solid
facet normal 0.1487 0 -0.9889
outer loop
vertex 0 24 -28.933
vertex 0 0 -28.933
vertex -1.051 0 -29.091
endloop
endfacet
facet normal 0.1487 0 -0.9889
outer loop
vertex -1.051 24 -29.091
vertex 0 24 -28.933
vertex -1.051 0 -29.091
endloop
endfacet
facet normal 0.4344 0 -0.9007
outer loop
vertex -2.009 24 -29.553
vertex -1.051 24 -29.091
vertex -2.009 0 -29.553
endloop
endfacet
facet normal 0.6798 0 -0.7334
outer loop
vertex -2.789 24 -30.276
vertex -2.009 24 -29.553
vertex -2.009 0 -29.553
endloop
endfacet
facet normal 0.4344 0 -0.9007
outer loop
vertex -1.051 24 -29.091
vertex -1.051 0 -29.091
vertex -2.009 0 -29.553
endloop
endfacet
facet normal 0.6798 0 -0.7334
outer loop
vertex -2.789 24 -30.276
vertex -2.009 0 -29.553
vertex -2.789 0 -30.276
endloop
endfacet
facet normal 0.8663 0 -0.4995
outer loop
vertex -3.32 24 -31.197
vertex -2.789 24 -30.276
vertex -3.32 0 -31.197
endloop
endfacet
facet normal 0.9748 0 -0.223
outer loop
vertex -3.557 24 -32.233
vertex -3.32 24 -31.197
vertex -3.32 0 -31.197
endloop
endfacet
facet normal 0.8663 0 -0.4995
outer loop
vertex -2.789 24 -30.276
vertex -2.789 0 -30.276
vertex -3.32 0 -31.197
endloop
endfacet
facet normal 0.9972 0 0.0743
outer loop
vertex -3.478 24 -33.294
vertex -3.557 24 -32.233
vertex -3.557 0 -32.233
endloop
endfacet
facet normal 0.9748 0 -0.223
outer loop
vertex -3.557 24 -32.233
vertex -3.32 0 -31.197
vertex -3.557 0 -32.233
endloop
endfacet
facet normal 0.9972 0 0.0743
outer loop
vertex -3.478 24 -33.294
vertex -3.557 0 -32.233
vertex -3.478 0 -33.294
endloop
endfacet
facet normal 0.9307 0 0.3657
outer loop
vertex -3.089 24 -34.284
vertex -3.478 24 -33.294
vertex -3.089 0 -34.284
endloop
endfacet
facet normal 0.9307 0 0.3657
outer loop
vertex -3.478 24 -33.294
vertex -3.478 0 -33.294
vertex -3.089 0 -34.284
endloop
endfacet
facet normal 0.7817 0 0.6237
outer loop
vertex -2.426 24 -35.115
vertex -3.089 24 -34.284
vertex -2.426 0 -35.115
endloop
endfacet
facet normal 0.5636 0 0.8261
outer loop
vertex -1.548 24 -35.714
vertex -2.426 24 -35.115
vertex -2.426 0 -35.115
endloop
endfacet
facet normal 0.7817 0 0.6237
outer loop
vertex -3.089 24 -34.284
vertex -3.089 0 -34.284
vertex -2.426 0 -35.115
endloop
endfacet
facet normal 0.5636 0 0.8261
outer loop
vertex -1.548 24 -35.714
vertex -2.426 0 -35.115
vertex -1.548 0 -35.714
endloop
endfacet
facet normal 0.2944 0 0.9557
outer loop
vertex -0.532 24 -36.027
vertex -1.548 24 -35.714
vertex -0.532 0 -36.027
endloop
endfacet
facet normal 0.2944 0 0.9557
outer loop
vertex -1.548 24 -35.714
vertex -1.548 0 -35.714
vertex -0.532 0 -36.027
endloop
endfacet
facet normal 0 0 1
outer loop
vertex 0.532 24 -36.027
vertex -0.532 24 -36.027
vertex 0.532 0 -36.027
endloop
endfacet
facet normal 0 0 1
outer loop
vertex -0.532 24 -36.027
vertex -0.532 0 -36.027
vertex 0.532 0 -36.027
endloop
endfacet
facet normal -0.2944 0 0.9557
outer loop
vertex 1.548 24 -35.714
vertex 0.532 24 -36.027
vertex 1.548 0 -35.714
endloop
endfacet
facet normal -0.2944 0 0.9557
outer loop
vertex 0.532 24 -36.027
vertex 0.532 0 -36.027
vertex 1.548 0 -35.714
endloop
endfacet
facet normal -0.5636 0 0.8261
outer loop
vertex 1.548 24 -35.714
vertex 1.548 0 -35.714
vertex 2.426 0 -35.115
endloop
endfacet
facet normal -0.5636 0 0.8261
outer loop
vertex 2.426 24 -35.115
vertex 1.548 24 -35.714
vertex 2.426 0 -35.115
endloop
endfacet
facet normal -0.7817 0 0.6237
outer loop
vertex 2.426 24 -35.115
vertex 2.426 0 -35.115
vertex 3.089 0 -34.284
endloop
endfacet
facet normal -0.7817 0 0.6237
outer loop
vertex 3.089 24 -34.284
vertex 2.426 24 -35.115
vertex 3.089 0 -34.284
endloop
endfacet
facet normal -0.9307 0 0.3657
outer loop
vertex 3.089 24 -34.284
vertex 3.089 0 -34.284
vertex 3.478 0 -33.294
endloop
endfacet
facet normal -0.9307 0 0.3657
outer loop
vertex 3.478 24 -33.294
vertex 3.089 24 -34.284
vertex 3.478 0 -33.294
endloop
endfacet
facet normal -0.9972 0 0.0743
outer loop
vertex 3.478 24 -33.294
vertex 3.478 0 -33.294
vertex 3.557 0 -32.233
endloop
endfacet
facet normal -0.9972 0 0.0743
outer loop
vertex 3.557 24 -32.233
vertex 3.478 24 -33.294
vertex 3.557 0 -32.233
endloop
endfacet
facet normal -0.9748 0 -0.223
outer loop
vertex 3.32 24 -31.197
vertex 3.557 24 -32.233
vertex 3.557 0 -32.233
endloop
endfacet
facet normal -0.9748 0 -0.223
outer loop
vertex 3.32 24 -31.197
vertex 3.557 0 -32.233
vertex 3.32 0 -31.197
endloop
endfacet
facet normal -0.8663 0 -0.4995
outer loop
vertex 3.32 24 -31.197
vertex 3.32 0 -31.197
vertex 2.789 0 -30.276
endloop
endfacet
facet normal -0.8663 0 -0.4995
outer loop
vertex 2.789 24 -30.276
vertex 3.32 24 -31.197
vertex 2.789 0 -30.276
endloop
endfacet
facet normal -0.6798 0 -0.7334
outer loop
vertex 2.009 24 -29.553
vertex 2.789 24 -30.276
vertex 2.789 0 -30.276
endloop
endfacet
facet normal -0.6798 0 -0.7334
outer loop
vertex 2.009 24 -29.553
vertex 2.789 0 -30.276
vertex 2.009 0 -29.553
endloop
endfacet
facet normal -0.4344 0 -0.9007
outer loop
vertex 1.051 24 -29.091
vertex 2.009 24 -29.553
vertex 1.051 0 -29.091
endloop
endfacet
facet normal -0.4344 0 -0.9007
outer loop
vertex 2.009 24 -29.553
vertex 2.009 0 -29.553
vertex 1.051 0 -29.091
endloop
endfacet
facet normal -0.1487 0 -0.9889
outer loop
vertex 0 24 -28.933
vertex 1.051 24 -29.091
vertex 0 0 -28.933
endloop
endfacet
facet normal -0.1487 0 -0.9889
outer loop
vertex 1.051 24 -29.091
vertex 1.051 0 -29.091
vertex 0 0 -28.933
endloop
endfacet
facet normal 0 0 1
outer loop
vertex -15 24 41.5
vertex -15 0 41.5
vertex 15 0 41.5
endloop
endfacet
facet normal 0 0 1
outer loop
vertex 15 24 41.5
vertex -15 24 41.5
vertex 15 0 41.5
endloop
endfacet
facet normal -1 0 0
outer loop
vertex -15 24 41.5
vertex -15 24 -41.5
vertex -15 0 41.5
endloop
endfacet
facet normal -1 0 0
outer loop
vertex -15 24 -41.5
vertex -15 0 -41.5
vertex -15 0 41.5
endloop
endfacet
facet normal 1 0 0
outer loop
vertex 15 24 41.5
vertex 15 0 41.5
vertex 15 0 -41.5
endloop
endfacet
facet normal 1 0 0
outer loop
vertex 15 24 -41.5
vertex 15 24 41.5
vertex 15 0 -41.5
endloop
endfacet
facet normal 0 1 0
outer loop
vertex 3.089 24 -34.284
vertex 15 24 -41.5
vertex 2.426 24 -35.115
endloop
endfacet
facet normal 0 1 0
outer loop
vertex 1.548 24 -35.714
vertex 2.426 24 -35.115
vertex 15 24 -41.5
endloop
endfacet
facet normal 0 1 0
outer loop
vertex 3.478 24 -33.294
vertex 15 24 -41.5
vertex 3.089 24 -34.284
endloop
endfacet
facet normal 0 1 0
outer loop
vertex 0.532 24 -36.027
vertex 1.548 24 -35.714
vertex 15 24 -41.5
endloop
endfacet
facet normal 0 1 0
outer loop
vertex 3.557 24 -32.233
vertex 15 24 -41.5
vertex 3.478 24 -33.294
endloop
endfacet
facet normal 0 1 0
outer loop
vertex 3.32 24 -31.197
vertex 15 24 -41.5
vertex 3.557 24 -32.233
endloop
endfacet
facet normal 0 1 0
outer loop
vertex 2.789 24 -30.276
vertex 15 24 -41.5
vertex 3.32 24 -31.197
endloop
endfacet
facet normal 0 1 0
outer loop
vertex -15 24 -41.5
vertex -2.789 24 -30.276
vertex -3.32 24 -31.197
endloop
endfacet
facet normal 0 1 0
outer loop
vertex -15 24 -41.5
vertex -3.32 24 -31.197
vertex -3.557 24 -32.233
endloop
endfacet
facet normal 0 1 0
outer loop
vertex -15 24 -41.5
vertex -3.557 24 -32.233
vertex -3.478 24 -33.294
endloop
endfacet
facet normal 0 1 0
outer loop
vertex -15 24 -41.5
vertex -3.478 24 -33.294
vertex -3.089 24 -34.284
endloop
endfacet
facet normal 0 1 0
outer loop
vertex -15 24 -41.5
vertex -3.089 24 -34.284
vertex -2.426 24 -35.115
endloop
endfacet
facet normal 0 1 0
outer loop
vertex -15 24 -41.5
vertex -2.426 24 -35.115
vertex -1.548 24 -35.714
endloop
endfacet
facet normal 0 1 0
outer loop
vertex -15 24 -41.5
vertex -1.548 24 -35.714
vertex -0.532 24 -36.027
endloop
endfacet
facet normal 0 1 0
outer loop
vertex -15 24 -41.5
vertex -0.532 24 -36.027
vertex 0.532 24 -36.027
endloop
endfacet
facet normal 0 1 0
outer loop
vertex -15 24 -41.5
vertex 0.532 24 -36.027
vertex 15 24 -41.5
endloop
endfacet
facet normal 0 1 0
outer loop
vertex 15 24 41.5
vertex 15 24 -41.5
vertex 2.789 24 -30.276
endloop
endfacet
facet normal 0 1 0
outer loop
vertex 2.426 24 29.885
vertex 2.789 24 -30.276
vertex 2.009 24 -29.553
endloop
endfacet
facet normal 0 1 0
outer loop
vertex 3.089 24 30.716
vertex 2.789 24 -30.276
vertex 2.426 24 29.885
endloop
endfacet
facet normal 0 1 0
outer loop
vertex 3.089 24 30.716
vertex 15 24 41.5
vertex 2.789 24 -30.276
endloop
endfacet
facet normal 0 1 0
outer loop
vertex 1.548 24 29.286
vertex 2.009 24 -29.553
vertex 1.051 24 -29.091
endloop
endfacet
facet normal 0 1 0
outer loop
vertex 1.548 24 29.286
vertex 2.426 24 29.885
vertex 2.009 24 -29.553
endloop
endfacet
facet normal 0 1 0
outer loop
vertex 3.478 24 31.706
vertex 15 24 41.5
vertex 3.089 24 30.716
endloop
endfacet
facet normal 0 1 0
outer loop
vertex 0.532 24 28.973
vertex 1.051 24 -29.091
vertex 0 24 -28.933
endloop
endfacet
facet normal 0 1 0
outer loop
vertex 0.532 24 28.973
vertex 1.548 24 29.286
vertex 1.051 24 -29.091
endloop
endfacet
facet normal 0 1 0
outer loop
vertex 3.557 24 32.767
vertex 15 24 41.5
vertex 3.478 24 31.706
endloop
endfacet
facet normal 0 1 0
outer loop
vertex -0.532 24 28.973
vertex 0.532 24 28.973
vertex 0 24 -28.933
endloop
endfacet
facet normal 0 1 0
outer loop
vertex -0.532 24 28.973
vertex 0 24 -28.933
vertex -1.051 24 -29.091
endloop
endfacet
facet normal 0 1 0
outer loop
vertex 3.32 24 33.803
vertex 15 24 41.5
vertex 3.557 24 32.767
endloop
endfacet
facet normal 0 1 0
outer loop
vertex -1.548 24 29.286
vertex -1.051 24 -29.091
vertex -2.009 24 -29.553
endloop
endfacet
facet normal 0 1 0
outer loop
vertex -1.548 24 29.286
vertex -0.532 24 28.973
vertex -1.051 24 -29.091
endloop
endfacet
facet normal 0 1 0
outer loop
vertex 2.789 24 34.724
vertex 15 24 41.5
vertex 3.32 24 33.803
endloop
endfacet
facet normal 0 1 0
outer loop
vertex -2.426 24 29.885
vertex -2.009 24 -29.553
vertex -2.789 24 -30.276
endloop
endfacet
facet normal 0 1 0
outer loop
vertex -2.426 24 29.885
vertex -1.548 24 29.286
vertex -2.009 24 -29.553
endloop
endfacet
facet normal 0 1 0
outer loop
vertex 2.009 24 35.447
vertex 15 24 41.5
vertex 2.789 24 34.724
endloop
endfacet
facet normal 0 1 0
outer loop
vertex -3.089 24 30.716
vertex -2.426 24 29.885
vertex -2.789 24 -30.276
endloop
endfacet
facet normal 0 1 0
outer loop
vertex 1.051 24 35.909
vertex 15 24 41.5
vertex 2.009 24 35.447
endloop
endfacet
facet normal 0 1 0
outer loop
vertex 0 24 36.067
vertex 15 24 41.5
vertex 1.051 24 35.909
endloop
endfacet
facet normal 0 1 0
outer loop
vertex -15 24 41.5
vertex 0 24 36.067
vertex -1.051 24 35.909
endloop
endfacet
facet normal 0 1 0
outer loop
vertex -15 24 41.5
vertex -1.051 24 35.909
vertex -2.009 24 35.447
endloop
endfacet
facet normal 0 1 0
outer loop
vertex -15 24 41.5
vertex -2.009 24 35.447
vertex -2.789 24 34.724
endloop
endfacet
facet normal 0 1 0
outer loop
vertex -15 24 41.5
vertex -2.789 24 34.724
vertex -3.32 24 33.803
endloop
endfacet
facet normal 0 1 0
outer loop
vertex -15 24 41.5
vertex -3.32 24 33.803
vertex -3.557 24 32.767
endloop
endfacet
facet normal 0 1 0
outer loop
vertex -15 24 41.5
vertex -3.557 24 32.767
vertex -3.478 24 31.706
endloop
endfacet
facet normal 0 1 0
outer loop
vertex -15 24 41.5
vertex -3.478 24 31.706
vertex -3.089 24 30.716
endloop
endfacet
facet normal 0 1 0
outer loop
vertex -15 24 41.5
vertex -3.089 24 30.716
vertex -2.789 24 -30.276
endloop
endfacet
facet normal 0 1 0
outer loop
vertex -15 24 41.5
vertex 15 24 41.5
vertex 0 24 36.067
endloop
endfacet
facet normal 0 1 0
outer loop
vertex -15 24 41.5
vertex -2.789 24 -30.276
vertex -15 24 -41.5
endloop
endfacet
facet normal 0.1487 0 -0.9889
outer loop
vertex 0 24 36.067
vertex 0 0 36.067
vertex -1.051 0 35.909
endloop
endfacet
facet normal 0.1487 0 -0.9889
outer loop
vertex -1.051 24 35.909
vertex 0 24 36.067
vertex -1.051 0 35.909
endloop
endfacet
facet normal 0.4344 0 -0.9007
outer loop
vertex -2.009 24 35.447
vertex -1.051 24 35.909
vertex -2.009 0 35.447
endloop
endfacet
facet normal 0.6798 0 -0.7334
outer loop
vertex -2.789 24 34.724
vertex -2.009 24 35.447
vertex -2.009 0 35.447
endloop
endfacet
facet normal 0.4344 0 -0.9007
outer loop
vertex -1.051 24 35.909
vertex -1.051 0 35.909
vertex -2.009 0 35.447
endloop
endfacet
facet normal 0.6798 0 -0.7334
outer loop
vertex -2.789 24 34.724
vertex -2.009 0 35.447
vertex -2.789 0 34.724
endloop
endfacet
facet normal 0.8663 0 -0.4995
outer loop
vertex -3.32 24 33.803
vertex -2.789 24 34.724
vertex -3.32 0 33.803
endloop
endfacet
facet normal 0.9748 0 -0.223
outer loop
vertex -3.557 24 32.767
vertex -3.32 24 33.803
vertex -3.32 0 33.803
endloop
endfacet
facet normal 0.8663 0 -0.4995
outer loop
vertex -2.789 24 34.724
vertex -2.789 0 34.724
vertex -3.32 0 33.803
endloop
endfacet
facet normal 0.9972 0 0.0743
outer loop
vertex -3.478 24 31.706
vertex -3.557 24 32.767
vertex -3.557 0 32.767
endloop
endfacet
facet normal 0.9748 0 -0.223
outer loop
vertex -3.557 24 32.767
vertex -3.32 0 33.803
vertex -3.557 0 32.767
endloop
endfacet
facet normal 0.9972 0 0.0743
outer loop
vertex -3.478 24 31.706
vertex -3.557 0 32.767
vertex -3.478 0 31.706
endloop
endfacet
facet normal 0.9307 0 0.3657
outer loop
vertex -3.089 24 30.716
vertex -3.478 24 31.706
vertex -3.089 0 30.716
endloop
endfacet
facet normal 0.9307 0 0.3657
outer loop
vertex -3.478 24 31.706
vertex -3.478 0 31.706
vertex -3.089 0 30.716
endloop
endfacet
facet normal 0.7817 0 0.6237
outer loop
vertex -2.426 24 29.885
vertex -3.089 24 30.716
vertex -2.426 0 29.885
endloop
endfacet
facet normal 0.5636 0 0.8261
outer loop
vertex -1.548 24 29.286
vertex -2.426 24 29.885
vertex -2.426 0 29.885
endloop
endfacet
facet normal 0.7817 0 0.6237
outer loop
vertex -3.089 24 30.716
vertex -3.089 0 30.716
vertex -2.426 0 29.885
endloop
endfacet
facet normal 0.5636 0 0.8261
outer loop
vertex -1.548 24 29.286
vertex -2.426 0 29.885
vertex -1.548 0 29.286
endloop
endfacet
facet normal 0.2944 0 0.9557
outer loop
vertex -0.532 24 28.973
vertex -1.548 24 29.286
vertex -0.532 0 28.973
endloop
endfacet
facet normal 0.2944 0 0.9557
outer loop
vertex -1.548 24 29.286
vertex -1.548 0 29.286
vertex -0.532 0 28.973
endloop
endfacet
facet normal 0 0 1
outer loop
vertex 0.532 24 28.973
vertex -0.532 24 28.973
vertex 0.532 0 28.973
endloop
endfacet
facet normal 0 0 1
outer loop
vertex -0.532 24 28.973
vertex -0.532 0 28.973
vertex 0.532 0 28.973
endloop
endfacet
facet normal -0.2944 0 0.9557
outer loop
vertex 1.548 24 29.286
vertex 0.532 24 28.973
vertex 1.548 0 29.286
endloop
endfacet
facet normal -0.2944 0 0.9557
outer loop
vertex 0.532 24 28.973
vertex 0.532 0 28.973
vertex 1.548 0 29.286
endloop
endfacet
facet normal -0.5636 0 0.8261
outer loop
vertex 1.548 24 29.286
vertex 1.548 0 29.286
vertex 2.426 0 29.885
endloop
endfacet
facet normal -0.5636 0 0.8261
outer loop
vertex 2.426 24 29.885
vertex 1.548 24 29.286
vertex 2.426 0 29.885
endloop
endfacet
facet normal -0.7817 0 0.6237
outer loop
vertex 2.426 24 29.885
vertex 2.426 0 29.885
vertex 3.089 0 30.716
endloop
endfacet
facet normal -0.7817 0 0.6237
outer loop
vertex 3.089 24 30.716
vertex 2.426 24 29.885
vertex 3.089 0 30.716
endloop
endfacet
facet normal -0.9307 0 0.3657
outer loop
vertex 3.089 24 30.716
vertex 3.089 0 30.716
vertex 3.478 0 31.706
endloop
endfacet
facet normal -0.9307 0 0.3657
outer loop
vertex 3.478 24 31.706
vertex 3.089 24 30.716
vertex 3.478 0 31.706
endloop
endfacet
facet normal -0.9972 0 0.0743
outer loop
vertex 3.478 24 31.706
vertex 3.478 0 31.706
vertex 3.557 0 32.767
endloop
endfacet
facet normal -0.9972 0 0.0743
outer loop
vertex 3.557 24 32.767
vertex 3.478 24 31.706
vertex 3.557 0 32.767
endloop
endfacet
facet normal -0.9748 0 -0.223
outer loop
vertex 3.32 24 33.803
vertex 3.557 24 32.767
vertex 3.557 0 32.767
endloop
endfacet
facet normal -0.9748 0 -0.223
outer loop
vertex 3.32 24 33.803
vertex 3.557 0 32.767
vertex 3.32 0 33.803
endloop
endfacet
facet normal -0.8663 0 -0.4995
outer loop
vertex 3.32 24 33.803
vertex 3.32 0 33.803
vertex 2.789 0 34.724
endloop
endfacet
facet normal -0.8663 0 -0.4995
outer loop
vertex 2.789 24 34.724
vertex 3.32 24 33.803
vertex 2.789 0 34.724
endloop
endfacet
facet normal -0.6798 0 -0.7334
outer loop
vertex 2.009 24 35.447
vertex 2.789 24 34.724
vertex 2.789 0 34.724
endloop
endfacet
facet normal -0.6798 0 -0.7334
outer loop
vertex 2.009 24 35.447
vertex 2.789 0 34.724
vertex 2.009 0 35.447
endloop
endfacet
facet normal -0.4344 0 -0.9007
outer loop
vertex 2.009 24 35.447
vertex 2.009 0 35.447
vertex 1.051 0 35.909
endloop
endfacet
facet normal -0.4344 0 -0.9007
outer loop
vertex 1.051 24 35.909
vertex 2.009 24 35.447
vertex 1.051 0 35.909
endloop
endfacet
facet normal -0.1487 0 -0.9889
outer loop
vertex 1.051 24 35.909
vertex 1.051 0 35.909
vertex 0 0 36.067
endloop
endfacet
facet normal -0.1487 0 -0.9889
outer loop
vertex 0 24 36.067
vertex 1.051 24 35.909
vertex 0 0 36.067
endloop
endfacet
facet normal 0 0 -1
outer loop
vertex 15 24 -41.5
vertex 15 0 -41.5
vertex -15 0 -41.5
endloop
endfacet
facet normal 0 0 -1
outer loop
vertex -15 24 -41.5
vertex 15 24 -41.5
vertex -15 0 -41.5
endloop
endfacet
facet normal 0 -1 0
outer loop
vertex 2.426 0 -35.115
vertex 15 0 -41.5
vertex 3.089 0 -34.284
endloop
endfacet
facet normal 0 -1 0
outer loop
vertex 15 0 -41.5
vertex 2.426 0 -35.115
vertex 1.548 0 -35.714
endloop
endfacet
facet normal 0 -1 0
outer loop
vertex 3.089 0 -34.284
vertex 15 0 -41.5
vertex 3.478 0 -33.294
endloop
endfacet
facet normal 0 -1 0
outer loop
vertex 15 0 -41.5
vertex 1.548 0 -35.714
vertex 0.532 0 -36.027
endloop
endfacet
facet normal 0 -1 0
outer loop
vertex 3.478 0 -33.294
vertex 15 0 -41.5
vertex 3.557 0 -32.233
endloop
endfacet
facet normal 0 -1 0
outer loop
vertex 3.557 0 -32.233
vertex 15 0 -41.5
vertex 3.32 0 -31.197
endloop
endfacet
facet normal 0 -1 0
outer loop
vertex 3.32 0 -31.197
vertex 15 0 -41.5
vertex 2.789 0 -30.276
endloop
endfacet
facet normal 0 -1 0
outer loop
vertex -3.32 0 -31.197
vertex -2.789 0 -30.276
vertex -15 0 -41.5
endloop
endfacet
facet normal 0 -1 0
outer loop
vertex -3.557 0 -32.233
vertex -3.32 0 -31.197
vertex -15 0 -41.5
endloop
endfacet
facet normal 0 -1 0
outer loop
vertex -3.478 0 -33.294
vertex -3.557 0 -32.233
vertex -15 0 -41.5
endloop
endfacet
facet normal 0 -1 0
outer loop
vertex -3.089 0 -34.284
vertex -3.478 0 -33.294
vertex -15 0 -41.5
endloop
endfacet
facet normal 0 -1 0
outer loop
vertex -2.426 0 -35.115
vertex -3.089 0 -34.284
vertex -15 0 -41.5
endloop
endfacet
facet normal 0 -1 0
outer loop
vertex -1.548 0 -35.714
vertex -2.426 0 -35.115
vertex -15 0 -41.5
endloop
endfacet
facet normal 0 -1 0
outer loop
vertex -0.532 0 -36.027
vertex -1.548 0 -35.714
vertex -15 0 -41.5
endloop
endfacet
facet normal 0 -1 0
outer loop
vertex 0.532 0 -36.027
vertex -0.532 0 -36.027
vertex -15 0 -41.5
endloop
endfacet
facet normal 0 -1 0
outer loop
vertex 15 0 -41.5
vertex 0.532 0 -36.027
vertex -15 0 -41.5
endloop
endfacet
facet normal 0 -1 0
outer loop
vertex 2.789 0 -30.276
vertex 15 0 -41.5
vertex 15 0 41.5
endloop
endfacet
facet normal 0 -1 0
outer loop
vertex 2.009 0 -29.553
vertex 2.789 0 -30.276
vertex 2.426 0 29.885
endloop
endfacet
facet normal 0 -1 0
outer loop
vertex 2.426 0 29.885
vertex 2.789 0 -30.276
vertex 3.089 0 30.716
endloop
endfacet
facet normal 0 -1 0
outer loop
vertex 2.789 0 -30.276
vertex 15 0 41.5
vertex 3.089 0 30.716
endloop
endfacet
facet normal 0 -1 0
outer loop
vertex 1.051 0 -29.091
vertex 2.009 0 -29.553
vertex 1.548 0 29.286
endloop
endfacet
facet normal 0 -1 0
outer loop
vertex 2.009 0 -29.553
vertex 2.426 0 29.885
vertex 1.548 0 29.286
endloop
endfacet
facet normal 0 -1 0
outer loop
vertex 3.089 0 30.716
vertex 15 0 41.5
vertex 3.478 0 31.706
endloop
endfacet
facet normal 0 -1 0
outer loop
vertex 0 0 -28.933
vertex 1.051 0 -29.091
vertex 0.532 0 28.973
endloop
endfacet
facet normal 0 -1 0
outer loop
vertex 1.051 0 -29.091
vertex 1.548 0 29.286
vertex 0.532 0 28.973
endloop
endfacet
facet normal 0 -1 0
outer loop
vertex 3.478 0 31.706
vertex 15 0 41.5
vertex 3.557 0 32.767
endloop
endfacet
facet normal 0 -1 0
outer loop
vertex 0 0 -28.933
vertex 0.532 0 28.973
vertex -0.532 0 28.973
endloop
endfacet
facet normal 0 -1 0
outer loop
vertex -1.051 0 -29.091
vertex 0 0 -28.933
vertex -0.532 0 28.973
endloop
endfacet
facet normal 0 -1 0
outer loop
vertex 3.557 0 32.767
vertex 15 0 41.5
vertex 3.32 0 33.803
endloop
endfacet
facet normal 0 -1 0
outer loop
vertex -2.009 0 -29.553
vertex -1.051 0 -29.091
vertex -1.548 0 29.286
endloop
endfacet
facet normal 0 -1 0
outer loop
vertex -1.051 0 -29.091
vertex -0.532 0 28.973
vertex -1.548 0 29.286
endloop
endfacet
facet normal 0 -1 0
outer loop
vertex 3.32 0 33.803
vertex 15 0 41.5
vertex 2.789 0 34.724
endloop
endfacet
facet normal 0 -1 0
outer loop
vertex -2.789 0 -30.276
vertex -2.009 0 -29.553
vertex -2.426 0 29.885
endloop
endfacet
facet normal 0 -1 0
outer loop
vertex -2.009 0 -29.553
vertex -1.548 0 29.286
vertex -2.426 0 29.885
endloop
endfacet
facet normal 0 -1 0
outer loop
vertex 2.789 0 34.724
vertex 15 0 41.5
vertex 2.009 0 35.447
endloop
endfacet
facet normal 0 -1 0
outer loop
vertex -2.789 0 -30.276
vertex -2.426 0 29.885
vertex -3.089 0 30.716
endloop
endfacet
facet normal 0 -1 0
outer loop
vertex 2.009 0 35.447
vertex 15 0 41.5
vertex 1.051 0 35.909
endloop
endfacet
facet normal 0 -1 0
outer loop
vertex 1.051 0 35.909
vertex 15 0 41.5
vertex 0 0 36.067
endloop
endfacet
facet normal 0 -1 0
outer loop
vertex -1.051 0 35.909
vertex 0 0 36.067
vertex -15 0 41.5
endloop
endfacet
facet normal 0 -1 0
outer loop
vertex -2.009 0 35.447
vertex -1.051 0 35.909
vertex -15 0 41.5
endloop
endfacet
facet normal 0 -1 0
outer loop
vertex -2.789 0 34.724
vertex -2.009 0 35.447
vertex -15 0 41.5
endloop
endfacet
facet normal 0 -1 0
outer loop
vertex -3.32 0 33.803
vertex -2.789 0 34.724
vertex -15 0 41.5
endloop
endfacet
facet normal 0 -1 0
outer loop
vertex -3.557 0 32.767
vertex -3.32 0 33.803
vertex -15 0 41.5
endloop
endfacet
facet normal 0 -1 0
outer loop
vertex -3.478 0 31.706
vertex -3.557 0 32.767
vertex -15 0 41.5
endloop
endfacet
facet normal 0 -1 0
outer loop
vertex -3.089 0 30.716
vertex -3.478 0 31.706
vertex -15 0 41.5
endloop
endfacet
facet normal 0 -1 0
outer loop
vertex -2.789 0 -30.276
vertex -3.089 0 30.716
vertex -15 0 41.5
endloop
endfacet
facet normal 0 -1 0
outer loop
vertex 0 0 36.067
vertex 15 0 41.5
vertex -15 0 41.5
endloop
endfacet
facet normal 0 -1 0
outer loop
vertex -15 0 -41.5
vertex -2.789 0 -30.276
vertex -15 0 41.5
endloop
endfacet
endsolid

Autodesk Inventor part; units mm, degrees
ref_plane "YZ Plane" through (0, 0, 0) normal (1, 0, 0) x (0, 1, 0)
ref_plane "XZ Plane" through (0, 0, 0) normal (0, 1, 0) x (-1, 0, 0)
ref_plane "XY Plane" through (0, 0, 0) normal (0, 0, 1) x (1, 0, 0)
sketch "Sketch1" plane through (0, 0, 0) normal (0, 1, 0) x (-1, 0, 0)
  line L0 (-15, -41.5) -> (15, -41.5)
  line L1 (15, -41.5) -> (15, 41.5)
  line L2 (15, 41.5) -> (-15, 41.5)
  line L3 (-15, 41.5) -> (-15, -41.5)
  line L4 (-15, -41.5) -> (15, 41.5) construction
  line L5 (15, -41.5) -> (-15, 41.5) construction
  point P0 (0, 0)
  dimension "d0" = 30
  dimension "d1" = 83
extrude "Extrusion1" add sketch "Sketch1" along normal blind 24
sketch "Sketch2" plane through (0, 24, 0) normal (0, 1, 0) x (1, 0, 0)
  line L0 (-15, 41.5) -> (-15, -41.5) projected
  line L1 (-15, -41.5) -> (15, -41.5) projected
  point P0 (0, 0)
  point P1 (0, -32.5)
  point P2 (0, 32.5)
  dimension "d4" = 15
  dimension "d6" = 9
  dimension "d14" = 65
  dimension "d15" = 15
hole "Hole1" at (0, 24, 32.5) at (0, 24, -32.5) direction (0, -1, 0) diameter 7.134 end through all thread size "M8x0.8" class "6H" standard "ISO Metric profile"
properties part number "Pillow_support" material "Stainless Steel"
